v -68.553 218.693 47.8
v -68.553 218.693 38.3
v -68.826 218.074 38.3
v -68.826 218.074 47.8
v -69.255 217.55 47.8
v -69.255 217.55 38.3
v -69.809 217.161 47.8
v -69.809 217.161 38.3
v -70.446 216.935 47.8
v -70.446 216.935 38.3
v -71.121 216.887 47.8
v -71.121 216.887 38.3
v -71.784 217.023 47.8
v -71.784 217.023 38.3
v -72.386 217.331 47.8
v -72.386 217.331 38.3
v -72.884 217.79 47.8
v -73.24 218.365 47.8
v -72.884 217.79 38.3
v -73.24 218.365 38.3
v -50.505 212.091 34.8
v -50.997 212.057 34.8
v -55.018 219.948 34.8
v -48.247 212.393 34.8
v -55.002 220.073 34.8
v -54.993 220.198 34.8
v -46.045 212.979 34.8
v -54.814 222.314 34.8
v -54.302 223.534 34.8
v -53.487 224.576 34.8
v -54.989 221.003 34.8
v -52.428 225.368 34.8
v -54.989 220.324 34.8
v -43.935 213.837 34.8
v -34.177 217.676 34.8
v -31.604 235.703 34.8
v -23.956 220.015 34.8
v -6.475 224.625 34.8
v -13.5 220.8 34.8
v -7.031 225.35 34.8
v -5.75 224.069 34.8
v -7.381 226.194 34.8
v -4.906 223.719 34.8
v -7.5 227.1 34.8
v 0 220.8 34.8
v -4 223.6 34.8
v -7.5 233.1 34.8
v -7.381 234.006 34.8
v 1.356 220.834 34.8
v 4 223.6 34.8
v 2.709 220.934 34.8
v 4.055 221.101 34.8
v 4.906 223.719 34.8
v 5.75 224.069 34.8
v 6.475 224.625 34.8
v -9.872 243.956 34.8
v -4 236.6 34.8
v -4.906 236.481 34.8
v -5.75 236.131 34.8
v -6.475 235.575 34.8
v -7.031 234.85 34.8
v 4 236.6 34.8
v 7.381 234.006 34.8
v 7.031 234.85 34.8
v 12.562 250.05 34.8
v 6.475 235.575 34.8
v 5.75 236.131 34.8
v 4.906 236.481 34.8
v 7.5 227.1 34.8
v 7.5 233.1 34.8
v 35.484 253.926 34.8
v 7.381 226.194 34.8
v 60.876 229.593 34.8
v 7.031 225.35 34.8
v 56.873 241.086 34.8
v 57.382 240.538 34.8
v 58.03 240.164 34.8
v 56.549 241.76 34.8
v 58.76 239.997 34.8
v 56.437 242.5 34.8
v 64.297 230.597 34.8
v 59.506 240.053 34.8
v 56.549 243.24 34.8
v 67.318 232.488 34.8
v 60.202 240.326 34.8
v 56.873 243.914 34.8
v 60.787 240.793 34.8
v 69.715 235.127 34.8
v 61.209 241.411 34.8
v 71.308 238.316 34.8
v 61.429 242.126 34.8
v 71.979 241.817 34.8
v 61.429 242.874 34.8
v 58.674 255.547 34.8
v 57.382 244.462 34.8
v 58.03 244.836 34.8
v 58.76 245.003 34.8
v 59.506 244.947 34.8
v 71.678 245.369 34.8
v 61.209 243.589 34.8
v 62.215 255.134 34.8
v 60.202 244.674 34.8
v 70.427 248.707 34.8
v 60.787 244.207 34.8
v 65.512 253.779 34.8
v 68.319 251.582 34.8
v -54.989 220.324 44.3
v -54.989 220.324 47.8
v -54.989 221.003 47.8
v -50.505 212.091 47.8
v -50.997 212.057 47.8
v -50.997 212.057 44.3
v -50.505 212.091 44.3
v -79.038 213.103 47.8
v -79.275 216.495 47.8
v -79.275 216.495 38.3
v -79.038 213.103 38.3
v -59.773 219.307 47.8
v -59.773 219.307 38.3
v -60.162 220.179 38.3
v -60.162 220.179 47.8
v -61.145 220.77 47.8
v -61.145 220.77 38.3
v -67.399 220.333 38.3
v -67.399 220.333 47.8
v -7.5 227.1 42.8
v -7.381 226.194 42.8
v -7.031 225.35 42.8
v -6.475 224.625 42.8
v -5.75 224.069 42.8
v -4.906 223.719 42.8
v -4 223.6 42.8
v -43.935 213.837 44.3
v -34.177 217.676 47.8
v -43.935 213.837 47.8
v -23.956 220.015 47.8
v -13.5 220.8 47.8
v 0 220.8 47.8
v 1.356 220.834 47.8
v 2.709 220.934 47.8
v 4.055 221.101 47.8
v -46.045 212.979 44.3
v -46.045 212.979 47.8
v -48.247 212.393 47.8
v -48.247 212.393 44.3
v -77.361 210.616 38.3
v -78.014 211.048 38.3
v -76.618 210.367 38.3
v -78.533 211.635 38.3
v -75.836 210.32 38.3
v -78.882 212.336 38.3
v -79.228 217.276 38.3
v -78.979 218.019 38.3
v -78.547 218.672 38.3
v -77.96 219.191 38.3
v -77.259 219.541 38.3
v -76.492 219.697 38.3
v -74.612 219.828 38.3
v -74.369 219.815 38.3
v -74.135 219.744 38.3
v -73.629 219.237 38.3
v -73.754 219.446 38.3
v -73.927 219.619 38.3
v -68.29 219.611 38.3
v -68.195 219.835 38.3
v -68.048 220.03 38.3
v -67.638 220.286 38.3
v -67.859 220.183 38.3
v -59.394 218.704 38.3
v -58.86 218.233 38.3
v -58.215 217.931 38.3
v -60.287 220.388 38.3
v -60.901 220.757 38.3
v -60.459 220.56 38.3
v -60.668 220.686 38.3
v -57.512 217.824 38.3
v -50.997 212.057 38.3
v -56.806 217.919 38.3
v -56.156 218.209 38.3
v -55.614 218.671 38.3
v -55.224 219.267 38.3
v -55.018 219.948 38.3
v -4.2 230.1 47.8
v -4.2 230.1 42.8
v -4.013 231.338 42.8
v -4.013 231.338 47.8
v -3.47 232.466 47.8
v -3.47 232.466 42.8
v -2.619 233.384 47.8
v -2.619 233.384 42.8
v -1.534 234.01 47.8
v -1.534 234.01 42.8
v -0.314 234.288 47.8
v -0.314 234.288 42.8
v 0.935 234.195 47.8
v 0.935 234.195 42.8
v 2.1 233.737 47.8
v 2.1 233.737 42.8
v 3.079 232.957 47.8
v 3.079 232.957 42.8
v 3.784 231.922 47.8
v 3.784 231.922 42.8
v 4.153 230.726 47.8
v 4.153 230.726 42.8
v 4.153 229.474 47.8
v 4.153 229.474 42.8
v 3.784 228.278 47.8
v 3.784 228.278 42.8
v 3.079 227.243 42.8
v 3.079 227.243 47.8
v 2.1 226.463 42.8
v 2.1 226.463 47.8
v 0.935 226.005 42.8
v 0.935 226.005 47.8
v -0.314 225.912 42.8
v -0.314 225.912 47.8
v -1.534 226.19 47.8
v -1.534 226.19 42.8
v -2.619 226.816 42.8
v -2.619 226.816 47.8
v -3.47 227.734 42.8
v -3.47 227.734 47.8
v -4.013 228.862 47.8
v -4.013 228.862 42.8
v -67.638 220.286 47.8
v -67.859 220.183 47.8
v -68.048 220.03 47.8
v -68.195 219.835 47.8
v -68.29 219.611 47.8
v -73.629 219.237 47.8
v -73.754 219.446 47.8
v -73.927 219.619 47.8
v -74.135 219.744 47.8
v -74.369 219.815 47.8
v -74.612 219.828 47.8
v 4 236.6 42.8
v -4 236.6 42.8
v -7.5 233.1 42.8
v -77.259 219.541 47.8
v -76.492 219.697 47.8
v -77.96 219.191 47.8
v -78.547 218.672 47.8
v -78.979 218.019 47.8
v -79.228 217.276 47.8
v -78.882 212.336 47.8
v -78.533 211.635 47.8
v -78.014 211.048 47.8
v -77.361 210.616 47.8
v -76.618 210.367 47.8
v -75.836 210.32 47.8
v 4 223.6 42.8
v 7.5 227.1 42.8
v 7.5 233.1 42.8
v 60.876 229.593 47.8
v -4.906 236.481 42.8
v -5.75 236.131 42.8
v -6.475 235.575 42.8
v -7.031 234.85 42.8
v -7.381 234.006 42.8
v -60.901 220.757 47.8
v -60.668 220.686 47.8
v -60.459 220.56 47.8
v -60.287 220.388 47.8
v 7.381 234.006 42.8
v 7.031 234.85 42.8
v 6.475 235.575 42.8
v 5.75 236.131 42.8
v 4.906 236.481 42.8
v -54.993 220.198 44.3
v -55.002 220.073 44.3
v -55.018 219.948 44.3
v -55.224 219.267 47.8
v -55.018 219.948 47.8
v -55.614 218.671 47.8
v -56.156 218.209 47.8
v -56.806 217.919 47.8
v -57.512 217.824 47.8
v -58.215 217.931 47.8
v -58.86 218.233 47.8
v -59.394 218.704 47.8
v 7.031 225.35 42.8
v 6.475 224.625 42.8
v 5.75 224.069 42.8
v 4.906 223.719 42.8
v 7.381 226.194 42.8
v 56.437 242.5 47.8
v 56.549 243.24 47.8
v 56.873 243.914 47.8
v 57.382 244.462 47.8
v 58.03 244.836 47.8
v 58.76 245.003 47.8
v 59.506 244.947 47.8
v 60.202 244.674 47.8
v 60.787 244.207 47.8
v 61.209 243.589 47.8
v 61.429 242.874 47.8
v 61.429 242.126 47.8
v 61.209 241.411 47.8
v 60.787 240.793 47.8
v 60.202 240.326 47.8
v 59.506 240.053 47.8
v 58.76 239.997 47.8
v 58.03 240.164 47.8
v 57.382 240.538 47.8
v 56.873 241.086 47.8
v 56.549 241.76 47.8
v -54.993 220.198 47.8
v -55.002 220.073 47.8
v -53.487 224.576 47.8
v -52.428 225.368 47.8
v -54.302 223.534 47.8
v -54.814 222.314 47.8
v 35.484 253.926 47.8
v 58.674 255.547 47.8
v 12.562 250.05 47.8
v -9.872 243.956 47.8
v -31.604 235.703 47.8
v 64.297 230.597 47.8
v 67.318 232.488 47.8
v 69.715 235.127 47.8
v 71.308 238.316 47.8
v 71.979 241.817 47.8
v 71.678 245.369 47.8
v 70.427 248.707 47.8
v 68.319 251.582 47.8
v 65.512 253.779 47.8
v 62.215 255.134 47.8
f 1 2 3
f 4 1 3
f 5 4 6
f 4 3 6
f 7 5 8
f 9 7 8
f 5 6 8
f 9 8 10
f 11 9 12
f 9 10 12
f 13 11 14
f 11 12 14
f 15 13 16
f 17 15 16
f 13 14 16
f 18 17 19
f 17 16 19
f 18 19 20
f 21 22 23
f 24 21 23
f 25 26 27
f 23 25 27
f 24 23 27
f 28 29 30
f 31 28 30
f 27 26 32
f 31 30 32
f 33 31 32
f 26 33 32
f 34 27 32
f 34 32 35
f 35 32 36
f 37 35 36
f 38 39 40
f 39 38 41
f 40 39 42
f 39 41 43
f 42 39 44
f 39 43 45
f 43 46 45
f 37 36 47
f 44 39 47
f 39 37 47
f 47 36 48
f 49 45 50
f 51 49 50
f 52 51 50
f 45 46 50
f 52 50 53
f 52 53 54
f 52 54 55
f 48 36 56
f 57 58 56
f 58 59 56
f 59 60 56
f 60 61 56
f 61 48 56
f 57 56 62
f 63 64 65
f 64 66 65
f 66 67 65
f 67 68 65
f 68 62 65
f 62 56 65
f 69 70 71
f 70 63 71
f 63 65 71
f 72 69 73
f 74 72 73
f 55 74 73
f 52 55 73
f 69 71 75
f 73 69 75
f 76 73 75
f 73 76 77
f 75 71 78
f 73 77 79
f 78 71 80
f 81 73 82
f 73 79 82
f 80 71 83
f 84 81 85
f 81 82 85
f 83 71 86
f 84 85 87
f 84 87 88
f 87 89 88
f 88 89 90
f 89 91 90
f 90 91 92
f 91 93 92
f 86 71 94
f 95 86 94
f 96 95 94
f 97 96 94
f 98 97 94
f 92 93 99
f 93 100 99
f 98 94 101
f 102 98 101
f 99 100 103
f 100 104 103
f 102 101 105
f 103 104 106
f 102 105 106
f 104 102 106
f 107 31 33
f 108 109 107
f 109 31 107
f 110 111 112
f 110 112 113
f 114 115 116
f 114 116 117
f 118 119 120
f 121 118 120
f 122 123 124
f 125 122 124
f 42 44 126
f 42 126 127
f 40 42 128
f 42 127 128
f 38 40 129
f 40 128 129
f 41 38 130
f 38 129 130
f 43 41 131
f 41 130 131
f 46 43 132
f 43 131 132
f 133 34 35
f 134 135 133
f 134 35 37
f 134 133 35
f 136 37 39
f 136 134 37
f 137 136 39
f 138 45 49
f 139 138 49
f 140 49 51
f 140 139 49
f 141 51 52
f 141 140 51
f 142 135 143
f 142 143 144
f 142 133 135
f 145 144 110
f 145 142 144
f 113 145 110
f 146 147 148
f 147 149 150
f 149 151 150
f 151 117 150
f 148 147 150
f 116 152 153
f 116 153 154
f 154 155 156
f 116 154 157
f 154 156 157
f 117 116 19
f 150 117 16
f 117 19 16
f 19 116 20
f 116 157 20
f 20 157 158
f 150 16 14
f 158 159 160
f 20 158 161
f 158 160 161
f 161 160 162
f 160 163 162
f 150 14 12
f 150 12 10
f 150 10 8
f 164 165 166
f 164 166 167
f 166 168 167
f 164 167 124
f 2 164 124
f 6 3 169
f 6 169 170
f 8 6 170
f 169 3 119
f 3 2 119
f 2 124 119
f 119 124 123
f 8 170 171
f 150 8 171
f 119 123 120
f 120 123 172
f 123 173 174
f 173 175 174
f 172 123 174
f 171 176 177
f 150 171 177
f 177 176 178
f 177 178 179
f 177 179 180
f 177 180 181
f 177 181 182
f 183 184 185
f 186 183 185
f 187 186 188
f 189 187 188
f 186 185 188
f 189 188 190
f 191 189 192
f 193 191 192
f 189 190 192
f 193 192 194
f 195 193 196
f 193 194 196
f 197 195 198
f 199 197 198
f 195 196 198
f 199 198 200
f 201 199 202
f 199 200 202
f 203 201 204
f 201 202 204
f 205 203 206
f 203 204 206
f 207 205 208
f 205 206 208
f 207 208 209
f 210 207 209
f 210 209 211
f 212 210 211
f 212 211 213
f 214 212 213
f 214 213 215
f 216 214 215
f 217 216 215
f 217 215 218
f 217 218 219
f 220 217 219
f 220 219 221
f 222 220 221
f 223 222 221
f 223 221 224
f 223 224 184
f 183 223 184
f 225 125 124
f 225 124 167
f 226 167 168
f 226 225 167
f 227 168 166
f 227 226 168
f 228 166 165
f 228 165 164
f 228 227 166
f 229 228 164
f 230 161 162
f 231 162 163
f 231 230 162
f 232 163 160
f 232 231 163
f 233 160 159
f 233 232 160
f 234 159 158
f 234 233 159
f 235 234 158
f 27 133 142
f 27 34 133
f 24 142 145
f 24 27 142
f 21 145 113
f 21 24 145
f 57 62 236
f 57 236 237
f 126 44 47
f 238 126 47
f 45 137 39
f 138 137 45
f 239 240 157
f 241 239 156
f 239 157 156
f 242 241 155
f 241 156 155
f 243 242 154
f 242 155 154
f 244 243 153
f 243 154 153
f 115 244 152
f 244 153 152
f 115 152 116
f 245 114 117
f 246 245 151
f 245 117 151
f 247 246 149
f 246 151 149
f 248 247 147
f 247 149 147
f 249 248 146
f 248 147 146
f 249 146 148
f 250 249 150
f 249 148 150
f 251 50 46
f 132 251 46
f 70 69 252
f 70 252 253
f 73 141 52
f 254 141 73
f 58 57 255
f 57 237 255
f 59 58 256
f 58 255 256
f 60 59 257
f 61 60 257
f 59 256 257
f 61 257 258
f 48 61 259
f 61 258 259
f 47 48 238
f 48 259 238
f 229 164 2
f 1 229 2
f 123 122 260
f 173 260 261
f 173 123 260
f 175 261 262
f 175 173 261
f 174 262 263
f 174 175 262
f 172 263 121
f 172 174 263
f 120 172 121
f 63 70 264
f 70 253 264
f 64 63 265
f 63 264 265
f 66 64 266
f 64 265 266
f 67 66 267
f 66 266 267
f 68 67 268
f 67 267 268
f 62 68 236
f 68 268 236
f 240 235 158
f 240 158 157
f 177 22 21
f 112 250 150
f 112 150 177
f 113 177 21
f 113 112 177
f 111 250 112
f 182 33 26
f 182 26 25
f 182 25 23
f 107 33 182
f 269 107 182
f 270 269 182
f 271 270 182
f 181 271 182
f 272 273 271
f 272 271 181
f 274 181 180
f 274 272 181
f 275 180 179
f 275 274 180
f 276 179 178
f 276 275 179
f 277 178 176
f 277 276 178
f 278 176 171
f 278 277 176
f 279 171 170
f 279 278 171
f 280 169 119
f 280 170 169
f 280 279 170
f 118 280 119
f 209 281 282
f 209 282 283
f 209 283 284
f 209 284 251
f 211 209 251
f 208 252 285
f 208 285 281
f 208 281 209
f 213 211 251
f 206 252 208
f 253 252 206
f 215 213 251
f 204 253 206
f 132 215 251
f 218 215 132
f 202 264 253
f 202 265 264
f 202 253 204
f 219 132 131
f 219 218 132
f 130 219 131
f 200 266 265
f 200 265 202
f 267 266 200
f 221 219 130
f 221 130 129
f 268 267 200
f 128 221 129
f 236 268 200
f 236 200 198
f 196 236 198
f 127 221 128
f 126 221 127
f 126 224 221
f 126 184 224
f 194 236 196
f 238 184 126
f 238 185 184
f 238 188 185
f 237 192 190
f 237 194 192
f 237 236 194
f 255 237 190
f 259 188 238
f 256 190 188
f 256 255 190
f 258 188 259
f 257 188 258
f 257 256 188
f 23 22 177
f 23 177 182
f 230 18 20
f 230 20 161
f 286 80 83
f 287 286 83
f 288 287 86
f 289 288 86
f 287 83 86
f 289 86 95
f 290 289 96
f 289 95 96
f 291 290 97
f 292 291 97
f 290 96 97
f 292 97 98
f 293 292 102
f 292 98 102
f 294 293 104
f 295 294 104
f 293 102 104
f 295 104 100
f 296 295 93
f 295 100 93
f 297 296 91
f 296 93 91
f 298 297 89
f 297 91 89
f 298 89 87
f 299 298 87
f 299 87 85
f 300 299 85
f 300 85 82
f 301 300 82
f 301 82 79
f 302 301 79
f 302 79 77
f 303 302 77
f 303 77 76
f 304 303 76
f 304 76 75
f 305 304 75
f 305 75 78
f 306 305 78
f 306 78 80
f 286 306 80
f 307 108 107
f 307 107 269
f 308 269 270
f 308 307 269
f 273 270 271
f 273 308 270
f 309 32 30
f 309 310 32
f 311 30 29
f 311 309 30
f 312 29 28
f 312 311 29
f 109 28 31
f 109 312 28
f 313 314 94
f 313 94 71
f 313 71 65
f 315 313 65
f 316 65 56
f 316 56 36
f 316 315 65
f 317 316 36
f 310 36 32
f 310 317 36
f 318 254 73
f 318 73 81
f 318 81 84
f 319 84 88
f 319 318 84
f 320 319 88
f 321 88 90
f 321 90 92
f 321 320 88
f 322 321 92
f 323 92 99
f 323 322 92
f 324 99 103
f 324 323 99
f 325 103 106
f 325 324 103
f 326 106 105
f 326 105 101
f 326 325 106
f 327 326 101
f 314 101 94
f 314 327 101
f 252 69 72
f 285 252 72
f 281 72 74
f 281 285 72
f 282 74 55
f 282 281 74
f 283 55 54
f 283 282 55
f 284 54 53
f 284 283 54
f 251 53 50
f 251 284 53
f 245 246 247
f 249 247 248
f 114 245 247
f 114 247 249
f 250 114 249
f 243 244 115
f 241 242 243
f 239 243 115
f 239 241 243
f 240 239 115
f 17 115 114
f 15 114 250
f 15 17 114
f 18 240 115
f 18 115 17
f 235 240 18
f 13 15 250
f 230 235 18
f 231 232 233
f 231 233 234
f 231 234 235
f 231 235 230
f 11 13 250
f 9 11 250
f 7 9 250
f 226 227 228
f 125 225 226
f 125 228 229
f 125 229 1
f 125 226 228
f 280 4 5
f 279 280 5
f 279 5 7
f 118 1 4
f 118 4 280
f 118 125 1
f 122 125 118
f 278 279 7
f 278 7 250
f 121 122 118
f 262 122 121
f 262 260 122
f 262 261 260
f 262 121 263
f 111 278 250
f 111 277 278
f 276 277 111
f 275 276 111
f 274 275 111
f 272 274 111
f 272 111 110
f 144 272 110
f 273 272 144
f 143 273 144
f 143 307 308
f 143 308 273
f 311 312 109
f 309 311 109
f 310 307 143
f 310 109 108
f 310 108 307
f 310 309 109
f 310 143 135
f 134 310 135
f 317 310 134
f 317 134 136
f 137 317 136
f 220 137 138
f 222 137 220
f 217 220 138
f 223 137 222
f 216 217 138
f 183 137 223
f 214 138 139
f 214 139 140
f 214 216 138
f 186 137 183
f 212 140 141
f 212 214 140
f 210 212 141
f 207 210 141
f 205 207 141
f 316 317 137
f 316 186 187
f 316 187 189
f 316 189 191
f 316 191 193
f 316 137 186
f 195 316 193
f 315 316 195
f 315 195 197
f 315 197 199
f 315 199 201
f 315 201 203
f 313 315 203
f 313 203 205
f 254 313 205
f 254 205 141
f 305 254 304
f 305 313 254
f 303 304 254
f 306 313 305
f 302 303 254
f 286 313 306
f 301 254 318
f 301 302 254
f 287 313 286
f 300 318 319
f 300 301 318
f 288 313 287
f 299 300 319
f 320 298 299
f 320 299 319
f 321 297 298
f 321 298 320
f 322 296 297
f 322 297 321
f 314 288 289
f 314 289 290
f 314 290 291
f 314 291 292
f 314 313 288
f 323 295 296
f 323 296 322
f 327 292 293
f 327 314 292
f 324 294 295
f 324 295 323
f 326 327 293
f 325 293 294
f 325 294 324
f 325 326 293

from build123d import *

# Parameters (mm, degrees)
BOSS_EXTRUDE1_DEPTH          = 3.5
BOSS_EXTRUDE2_DEPTH          = 9.5
BOSS_EXTRUDE2_DEPTH_BACK     = 3.5
CUT_EXTRUDE1_DEPTH           = 268.941422383
SKETCH4_W                    = 15
SKETCH4_H                    = 13
CUT_EXTRUDE2_DEPTH           = 8
F_5_16_CLEARANCE_HOLE1_D     = 8.4
F_5_16_CLEARANCE_HOLE1_DEPTH = 13
FILLET1_R                    = 1
FILLET2_R                    = 3
FILLET3_R                    = 3.5
FILLET4_R                    = 5
FILLET5_R                    = 18
FILLET6_R                    = 27.432772437
SKETCH9_R                    = 2.51
CUT_EXTRUDE3_DEPTH           = 268.881580074
CUT_EXTRUDE4_DEPTH           = 3.5


with BuildPart() as part:
    # Sketch1 → Boss-Extrude1 (new body)
    with BuildSketch(Plane.XY.offset(47.8)):
        with BuildLine():
            Line((-55.017772963, 219.948002855), (-50.996862784, 212.056522295))
            Line((-50.996862784, 212.056522295), (-46.846659232, 212.346732798))
            ThreePointArc((-46.846659232, 212.346732798), (-30.700707895, 218.653781383), (-13.5, 220.8))
            Line((-13.5, 220.8), (2.038607139, 220.8))
            Line((2.038607139, 220.8), (60.876238897, 229.593342983))
            ThreePointArc((60.876238897, 229.593342983), (71.950599997, 243.603343771), (58.674027502, 255.547137919))
            ThreePointArc((58.674027502, 255.547137919), (-0.148756736, 246.886614708), (-54.989372002, 223.916383428))
            Line((-54.989372002, 223.916383428), (-54.989372002, 220.323766337))
            ThreePointArc((-54.989372002, 220.323766337), (-54.996482354, 220.13534871), (-55.017772963, 219.948002855))
        make_face()
    extrude(amount=-BOSS_EXTRUDE1_DEPTH)

    # Sketch2 → Boss-Extrude2 (add, two sides: drawn at the far end of the back side and taken through both)
    with BuildSketch(Plane(origin=(0, 0, 44.3), x_dir=(-1, 0, 0), z_dir=(0, 0, -1)).offset(-BOSS_EXTRUDE2_DEPTH_BACK)):
        with BuildLine():
            Line((60.44632379, 220.818705454), (79.484610639, 219.487418749))
            Line((79.484610639, 219.487418749), (78.828899786, 210.110316677))
            Line((78.828899786, 210.110316677), (46.846659232, 212.346732798))
            ThreePointArc((46.846659232, 212.346732798), (30.700707895, 218.653781383), (13.5, 220.8))
            Line((13.5, 220.8), (-2.038607139, 220.8))
            Line((-2.038607139, 220.8), (-60.876238897, 229.593342983))
            ThreePointArc((-60.876238897, 229.593342983), (-71.950599997, 243.603343771), (-58.674027502, 255.547137919))
            ThreePointArc((-58.674027502, 255.547137919), (0.148756736, 246.886614708), (54.989372002, 223.916383428))
            Line((54.989372002, 223.916383428), (54.989372002, 220.323766337))
            ThreePointArc((54.989372002, 220.323766337), (56.969592775, 217.878397335), (59.773235646, 219.306924729))
            Line((59.773235646, 219.306924729), (60.44632379, 220.818705454))
        make_face()
    extrude(amount=BOSS_EXTRUDE2_DEPTH + BOSS_EXTRUDE2_DEPTH_BACK)

    # Sketch3 → Cut-Extrude1 (cut, through all)
    with BuildSketch(Plane(origin=(0, 0, 34.8), x_dir=(-1, 0, 0), z_dir=(0, 0, -1))):
        with BuildLine():
            Line((73.913438469, 219.876993058), (68.097193955, 220.283704494))
            Line((68.097193955, 220.283704494), (68.55333244, 218.692960552))
            ThreePointArc((68.55333244, 218.692960552), (70.782095496, 216.888143816), (73.240350324, 218.365212333))
            Line((73.240350324, 218.365212333), (73.913438469, 219.876993058))
        make_face()
    extrude(amount=-CUT_EXTRUDE1_DEPTH, mode=Mode.SUBTRACT)

    # Sketch4 → Cut-Extrude2 (cut)
    with BuildSketch(Plane(origin=(0, 0, 34.8), x_dir=(-1, 0, 0), z_dir=(0, 0, -1))):
        with Locations((0, 230.1)):
            Rectangle(SKETCH4_W, SKETCH4_H)
    extrude(amount=-CUT_EXTRUDE2_DEPTH, mode=Mode.SUBTRACT)

    # 5/16 Clearance Hole1
    with Locations(Plane.XY.offset(47.8)):
        with Locations((0, 230.1)):
            Hole(F_5_16_CLEARANCE_HOLE1_D / 2, depth=F_5_16_CLEARANCE_HOLE1_DEPTH)

    # Fillet1
    fillet1_edges = [part.edges().sort_by_distance(p)[0] for p in [
        (-60.44632379, 220.818705454, 41.3),
        (-73.913438469, 219.876993058, 41.3),
        (-68.097193955, 220.283704494, 41.3),
    ]]
    fillet(fillet1_edges, radius=FILLET1_R)

    # Fillet2
    fillet2_edges = [part.edges().sort_by_distance(p)[0] for p in [
        (-79.484610639, 219.487418749, 41.3),
        (-78.828899786, 210.110316677, 41.3),
    ]]
    fillet(fillet2_edges, radius=FILLET2_R)

    # Fillet3
    fillet3_edges = [part.edges().sort_by_distance(p)[0] for p in [
        (-7.5, 236.6, 38.8),
        (-7.5, 223.6, 38.8),
        (7.5, 223.6, 38.8),
        (7.5, 236.6, 38.8),
    ]]
    fillet(fillet3_edges, radius=FILLET3_R)

    # Fillet4
    fillet4_edges = [part.edges().sort_by_distance(p)[0] for p in [
        (-54.989372002, 223.916383428, 41.3),
    ]]
    fillet(fillet4_edges, radius=FILLET4_R)

    # Fillet5
    fillet5_edges = [part.edges().sort_by_distance(p)[0] for p in [
        (-46.846659232, 212.346732798, 41.3),
    ]]
    fillet(fillet5_edges, radius=FILLET5_R)

    # Fillet6
    fillet6_edges = [part.edges().sort_by_distance(p)[0] for p in [
        (2.038607139, 220.8, 41.3),
    ]]
    fillet(fillet6_edges, radius=FILLET6_R)

    # Sketch9 → Cut-Extrude3 (cut, through all)
    with BuildSketch(Plane(origin=(0, 0, 34.8), x_dir=(-1, 0, 0), z_dir=(0, 0, -1))):
        with Locations((-58.947326081, 242.5)):
            Circle(SKETCH9_R)
    extrude(amount=-CUT_EXTRUDE3_DEPTH, mode=Mode.SUBTRACT)

    # Sketch10 → Cut-Extrude4 (cut)
    with BuildSketch(Plane(origin=(0, 0, 34.8), x_dir=(-1, 0, 0), z_dir=(0, 0, -1))):
        Polygon((50.996862784, 212.056522295), (55.017772963, 219.948002855), (56.636135003, 223.124217196), (80.862126047, 221.430170876), (79.948532306, 208.3651717), (50.433855775, 210.429038936), align=None)
    extrude(amount=-CUT_EXTRUDE4_DEPTH, mode=Mode.SUBTRACT)


solid = part.part
